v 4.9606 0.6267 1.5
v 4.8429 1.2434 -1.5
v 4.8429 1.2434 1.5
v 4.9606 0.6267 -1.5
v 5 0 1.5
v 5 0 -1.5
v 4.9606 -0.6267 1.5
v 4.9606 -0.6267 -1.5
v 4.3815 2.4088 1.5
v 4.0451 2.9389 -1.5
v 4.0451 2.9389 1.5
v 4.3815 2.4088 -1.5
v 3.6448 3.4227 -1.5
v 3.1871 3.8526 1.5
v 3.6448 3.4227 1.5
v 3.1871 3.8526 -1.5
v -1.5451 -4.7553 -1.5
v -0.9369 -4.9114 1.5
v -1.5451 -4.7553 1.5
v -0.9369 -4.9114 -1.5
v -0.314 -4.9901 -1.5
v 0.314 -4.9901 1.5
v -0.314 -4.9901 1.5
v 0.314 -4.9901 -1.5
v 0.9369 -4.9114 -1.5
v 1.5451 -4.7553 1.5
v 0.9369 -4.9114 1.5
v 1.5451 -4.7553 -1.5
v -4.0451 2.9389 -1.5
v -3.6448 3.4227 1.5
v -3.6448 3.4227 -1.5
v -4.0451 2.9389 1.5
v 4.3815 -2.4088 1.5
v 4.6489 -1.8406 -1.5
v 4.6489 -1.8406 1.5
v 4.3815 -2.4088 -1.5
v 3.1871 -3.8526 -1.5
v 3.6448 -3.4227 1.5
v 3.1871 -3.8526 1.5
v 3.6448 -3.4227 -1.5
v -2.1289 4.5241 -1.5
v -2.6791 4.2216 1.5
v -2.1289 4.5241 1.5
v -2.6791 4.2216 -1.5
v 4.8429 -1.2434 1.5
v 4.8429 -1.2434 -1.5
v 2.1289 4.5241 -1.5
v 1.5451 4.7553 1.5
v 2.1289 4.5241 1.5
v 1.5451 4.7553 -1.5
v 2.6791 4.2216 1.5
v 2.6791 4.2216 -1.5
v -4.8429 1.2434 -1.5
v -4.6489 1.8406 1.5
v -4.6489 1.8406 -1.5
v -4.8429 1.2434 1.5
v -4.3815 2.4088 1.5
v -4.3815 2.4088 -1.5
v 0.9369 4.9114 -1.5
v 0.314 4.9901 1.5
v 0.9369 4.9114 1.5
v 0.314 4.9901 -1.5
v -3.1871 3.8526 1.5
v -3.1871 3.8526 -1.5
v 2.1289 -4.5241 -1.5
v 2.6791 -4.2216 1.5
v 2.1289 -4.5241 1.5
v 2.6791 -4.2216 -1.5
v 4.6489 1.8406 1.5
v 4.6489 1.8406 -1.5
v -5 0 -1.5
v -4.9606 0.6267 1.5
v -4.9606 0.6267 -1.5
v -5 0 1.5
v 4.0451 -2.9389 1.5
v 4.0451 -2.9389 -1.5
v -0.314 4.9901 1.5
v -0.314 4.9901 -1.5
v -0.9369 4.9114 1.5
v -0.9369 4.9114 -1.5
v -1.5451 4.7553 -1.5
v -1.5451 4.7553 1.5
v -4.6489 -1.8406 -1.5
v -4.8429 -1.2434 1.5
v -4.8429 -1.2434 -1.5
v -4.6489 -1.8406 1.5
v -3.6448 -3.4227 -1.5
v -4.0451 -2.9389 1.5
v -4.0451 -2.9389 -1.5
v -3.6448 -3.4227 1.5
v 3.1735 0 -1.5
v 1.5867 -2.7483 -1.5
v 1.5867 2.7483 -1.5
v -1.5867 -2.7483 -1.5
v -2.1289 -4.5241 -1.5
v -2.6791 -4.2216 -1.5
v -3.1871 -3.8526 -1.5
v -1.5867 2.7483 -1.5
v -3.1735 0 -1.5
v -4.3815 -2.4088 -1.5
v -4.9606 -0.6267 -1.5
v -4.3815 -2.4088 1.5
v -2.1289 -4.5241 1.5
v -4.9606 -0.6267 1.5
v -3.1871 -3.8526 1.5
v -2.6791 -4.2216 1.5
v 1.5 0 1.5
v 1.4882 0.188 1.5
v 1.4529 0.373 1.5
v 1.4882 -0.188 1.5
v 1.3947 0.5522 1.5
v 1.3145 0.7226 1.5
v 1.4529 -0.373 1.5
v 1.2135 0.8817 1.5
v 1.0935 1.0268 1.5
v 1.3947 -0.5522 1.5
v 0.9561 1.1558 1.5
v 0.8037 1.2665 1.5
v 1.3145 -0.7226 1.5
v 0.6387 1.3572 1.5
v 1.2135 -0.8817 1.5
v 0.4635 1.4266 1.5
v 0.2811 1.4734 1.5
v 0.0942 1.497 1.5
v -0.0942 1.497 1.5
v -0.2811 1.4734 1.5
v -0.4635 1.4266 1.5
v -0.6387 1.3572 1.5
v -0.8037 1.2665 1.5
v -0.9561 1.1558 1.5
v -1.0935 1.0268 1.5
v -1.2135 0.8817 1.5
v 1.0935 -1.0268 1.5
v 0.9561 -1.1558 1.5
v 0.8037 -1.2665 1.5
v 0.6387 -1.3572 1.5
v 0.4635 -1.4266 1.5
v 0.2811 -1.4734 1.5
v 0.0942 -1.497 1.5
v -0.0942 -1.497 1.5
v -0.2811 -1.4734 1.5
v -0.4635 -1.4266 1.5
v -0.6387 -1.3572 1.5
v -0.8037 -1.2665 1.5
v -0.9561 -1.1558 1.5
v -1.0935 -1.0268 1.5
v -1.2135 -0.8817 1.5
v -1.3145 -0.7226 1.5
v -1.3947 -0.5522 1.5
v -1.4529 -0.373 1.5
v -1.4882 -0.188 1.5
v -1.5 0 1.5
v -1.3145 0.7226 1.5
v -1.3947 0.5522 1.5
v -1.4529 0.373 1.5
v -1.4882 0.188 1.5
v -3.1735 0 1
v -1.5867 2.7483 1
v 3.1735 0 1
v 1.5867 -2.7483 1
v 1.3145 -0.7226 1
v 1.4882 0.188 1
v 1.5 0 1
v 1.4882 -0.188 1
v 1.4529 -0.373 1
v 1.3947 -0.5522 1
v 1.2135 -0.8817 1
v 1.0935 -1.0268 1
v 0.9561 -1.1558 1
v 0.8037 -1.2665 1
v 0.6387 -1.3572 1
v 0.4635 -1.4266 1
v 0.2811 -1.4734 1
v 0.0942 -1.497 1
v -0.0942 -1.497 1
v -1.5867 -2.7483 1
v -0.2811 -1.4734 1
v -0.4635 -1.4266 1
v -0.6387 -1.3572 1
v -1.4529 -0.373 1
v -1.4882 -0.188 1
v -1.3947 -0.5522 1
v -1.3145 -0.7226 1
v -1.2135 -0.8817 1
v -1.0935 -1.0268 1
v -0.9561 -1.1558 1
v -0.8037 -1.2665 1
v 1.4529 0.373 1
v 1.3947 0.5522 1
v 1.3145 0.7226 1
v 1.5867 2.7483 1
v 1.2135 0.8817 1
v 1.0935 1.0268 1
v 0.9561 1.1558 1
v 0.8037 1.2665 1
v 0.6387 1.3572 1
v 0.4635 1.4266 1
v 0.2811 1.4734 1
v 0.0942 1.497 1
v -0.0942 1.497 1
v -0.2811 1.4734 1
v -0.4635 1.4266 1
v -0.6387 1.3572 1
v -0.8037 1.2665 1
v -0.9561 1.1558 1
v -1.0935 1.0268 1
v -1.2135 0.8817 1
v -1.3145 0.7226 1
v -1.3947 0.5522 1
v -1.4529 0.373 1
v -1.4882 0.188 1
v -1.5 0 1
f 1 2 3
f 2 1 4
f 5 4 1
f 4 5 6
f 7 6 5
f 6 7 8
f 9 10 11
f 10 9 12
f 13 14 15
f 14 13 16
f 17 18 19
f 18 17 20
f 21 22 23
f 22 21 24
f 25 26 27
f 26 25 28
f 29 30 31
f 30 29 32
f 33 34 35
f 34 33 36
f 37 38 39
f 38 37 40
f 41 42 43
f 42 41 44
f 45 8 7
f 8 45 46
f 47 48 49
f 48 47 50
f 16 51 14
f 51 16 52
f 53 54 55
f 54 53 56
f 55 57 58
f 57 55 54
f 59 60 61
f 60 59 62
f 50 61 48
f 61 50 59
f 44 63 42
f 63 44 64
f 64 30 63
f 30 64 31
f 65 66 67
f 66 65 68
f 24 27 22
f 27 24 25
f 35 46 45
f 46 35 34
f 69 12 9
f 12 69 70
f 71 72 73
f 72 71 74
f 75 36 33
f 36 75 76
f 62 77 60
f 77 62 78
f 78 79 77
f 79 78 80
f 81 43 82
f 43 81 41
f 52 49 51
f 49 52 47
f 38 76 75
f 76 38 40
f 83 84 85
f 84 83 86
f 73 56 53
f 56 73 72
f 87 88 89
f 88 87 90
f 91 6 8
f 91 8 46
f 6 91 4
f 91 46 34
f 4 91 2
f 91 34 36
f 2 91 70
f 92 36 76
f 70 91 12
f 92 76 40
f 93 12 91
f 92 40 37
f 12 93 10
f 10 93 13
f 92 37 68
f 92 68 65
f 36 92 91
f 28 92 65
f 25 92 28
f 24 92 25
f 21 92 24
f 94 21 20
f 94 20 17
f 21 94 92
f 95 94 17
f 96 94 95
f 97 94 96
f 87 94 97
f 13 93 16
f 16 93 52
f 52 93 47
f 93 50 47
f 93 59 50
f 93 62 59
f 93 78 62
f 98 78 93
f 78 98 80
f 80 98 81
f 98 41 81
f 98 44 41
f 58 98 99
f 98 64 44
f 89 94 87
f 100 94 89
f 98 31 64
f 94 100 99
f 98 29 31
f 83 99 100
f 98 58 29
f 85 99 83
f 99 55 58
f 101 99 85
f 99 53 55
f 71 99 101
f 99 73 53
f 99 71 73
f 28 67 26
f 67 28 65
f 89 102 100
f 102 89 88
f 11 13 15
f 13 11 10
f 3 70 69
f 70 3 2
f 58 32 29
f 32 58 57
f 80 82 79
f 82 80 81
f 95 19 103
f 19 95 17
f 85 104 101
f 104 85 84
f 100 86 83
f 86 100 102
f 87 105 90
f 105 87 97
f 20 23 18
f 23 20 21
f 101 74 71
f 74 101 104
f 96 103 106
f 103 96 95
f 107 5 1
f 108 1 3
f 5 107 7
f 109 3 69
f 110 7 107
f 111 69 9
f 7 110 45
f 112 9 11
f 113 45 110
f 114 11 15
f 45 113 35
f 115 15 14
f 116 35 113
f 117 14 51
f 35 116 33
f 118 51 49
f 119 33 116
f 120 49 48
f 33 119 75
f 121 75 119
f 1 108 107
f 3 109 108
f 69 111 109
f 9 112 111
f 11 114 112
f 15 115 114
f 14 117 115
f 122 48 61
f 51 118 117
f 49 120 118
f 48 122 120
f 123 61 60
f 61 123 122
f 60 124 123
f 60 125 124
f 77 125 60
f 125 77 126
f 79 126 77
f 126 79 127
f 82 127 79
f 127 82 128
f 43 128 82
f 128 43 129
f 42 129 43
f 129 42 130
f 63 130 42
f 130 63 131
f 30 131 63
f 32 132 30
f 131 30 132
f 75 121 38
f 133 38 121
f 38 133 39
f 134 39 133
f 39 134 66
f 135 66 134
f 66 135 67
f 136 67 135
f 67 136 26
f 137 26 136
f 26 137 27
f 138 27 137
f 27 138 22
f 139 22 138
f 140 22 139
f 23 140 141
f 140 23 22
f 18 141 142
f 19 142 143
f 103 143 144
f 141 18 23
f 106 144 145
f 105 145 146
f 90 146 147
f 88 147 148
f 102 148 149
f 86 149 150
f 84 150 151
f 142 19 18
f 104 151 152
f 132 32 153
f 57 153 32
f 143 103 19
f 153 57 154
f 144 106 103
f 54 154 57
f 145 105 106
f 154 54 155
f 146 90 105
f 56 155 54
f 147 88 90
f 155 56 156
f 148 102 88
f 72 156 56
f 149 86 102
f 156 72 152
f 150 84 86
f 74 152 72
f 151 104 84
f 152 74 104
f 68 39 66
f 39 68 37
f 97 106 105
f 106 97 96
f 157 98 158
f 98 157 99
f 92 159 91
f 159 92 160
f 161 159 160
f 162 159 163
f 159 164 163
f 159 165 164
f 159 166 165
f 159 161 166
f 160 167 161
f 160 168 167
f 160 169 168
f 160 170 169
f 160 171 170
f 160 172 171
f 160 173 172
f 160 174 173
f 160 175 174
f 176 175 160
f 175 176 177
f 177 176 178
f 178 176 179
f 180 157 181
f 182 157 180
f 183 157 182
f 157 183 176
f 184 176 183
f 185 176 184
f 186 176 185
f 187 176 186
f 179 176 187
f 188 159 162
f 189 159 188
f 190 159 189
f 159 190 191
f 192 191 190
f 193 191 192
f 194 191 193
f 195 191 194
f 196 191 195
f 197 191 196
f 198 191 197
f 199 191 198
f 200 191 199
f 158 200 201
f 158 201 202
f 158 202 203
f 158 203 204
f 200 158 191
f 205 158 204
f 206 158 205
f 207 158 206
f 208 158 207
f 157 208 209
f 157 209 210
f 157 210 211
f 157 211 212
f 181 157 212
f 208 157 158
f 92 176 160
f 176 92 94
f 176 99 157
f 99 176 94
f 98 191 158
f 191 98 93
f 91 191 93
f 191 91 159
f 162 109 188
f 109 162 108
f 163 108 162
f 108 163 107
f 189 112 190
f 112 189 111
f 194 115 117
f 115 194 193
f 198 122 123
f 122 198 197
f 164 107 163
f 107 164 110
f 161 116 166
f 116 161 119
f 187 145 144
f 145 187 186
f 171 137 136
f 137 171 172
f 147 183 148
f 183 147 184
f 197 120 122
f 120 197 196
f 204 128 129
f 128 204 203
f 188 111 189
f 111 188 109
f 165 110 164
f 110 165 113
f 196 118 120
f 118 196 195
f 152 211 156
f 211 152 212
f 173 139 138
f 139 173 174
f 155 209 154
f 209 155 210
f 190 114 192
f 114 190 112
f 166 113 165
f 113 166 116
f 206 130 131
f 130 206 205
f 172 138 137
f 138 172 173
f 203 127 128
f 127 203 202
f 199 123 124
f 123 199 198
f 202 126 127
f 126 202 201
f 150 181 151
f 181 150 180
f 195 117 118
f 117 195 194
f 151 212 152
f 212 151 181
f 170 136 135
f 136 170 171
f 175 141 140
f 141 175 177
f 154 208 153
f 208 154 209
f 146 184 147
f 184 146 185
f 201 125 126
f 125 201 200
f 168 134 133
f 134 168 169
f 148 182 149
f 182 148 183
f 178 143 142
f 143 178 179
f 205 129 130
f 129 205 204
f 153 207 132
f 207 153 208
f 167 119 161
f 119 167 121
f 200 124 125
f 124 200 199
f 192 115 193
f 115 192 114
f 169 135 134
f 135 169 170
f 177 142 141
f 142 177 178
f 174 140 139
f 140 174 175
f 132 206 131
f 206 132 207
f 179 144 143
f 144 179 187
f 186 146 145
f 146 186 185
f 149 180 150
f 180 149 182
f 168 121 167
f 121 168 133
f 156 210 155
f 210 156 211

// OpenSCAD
$fn = 50;


difference() {
	union() {
		translate(v = [0, 0, -1.5000000000]) {
			cylinder(h = 3, r = 5.0000000000);
		}
		translate(v = [0, 0, -1.5000000000]) {
			cylinder(h = 3, r = 3.0000000000);
		}
	}
	union() {
		translate(v = [0, 0, -1.5000000000]) {
			rotate(a = [0, 0, 0]) {
				difference() {
					union() {
						#linear_extrude(height = 2.5000000000) {
							polygon(points = [[3.1735000000, 0.0000000000], [1.5867500000, 2.7483316189], [-1.5867500000, 2.7483316189], [-3.1735000000, 0.0000000000], [-1.5867500000, -2.7483316189], [1.5867500000, -2.7483316189]]);
						}
					}
					union();
				}
			}
		}
		translate(v = [0, 0, -50.0000000000]) {
			cylinder(h = 100, r = 1.5000000000);
		}
	}
}
